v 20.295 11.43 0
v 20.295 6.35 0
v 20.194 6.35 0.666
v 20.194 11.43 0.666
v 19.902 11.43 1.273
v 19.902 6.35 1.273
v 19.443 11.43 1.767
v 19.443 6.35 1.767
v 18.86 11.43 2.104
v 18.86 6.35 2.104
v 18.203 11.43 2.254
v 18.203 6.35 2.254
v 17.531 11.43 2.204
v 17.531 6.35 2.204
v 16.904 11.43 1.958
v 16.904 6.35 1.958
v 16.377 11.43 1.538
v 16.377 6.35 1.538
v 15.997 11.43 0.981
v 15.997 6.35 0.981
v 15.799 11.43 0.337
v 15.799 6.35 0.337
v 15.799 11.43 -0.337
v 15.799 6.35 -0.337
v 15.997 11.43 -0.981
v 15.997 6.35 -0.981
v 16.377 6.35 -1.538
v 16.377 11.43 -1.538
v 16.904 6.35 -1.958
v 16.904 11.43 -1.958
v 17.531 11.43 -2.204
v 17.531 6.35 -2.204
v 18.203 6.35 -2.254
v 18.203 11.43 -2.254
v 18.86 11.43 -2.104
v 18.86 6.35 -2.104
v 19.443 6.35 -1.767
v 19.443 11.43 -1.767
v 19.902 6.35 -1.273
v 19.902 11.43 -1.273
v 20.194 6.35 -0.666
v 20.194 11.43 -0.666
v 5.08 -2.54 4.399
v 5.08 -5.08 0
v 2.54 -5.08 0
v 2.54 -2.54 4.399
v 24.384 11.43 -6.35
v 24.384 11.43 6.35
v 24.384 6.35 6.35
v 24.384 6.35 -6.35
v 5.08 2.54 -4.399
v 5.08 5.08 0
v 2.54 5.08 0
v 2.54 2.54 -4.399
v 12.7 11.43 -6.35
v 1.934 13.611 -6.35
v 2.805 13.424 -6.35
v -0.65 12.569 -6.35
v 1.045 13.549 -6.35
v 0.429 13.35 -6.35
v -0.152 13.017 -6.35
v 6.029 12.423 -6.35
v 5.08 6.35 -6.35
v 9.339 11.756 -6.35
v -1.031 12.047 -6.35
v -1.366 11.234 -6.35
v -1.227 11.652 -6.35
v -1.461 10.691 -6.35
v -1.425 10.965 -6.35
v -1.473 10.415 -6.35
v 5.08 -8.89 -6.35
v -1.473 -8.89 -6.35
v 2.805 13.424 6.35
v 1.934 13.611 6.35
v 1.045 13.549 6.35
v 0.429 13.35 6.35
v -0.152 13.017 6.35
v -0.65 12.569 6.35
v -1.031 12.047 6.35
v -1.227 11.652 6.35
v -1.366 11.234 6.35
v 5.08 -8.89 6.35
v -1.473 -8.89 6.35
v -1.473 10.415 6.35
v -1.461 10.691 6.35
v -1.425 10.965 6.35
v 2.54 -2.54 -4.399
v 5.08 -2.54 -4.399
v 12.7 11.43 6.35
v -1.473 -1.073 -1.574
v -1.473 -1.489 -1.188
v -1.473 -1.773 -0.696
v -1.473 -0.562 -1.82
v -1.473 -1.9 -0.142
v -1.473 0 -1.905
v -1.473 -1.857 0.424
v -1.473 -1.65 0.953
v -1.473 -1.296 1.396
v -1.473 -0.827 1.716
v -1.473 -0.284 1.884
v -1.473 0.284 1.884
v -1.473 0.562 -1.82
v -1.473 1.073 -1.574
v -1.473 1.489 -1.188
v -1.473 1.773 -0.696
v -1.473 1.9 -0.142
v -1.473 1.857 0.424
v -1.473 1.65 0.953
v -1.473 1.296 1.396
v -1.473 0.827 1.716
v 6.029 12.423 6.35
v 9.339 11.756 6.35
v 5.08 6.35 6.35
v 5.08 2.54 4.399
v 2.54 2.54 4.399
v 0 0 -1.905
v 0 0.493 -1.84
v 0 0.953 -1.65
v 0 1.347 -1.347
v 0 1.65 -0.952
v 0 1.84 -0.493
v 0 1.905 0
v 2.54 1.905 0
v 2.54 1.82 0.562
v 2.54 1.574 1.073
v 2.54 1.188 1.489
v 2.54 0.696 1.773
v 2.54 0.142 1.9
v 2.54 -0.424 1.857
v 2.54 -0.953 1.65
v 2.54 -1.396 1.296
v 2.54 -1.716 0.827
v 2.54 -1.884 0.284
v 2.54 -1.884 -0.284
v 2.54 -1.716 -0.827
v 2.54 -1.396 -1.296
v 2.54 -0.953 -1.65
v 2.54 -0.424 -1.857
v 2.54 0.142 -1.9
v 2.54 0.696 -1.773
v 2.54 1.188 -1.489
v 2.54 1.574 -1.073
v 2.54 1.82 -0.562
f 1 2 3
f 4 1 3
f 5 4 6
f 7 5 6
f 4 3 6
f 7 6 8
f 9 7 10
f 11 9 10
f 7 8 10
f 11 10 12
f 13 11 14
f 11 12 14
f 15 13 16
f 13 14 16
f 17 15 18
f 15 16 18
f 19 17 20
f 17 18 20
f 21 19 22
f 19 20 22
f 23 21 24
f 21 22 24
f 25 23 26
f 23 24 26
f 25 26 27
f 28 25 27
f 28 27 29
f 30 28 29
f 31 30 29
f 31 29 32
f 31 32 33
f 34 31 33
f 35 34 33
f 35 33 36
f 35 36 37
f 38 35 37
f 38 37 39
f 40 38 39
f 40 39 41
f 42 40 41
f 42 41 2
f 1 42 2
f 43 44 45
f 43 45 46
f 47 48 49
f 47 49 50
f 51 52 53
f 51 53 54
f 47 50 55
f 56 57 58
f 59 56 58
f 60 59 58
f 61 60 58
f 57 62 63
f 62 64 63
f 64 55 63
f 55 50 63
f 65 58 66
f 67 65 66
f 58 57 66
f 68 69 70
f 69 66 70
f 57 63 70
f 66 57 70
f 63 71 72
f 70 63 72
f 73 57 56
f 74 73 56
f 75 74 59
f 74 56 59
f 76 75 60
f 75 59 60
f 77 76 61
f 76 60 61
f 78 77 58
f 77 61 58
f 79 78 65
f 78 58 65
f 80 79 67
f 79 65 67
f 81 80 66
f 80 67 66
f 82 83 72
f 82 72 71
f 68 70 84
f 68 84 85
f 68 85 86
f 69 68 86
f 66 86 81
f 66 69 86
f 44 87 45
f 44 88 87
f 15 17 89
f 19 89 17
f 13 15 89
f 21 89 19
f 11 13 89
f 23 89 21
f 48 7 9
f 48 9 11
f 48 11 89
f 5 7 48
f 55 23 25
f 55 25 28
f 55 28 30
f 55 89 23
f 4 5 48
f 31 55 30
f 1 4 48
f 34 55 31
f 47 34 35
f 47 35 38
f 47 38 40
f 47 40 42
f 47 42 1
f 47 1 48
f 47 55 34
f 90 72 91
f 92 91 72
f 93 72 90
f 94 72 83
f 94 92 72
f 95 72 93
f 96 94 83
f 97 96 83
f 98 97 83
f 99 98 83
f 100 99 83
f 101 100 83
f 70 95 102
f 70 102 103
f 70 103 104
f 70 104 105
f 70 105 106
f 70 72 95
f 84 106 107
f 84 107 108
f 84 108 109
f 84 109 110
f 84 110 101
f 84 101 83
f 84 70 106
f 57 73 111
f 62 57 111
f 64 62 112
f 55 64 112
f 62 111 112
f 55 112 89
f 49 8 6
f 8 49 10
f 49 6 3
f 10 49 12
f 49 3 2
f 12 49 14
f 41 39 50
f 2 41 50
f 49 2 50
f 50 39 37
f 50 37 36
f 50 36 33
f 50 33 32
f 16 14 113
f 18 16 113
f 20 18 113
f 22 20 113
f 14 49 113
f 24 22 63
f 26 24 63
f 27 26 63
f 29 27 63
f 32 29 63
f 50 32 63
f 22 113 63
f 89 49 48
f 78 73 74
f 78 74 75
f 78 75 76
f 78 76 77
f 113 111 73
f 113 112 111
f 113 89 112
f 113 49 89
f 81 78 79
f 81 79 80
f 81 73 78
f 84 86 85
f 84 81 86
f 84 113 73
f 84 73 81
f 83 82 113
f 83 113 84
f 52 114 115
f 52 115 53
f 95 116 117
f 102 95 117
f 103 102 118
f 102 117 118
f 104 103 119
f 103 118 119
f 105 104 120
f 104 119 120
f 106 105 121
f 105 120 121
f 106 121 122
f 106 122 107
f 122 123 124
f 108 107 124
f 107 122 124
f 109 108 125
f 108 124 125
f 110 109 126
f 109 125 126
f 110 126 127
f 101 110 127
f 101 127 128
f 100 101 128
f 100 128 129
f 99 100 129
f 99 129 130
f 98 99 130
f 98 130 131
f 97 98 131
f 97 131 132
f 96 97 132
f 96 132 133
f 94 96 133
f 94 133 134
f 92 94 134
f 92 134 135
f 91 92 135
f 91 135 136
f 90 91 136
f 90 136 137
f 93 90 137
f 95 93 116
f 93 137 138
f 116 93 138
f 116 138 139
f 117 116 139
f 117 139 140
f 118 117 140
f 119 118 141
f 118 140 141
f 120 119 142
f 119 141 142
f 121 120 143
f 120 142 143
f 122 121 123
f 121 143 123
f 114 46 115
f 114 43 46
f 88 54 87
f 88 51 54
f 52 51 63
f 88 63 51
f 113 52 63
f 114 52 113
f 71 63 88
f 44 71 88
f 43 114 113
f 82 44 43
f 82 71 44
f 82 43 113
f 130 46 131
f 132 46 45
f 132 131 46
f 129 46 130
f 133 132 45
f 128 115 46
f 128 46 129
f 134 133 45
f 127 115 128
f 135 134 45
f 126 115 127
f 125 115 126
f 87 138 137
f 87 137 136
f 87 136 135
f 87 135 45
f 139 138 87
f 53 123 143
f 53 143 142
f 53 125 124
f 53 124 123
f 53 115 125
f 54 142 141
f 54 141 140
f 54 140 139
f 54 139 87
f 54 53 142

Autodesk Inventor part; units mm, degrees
ref_plane "YZ Plane" through (0, 0, 0) normal (1, 0, 0) x (0, 1, 0)
ref_plane "XZ Plane" through (0, 0, 0) normal (0, 1, 0) x (-1, 0, 0)
ref_plane "XY Plane" through (0, 0, 0) normal (0, 0, 1) x (1, 0, 0)
sketch "Sketch1" plane through (0, 0, 0) normal (1, 0, 0) x (0, 1, 0)
  circle A0 centre (0, 0) radius 1.905
  line L0 (0, 0) -> (0, -6.35)
  line L1 (0, 0) -> (0, 6.35)
  line L2 (0, 6.35) -> (-6.35, 6.35)
  line L3 (0, -6.35) -> (6.35, -6.35)
  line L4 (-6.35, 6.35) -> (6.35, 6.35)
  line L5 (6.35, 6.35) -> (6.35, -6.35)
  line L6 (6.35, -6.35) -> (-6.35, -6.35)
  line L7 (-6.35, -6.35) -> (-6.35, 6.35)
  dimension "d0" = 3.81
  dimension "d2" = 6.35
  dimension "d3" = 6.35
  dimension "d4" = 6.35
  dimension "d5" = 6.35
extrude "Extrusion1" add sketch "Sketch1" along normal blind 5.08 contours A0 L1 L4 L5 L3 L0 | A0 L0 L6 L7 L2 L1
sketch "Sketch2" plane through (5.08, 0, 0) normal (1, 0, 0) x (0, 0, -1)
  point P0 (0, 0)
sketch "Sketch3" plane through (5.08, 0, 0) normal (1, 0, 0) x (0, 0, -1)
  line L0 (0, 0) -> (0, -5.08)
  arc A0 (0, -5.08) -> (0, 0) centre (-4.3994, -2.54) ccw
  line L1 (4.3994, -2.54) -> (0, -5.08)
  line L2 (0, -5.08) -> (-4.3994, -2.54)
  line L3 (-4.3994, 2.54) -> (0, 5.08)
  line L4 (4.3994, 2.54) -> (4.3994, -2.54)
  line L5 (-4.3994, -2.54) -> (-4.3994, 2.54)
  line L6 (0, 5.08) -> (4.3994, 2.54)
  dimension "d8" = 5.08
extrude "Extrusion2" cut sketch "Sketch3" against normal blind 2.54 contours A0 L0 | L2 L5 L3 L6 L4 L1
sketch "Sketch4" plane through (0, -6.35, -6.35) normal (0, -1, 0) x (1, 0, 0)
  line L0 (0, 12.7) -> (5.08, 12.7) projected
  line L1 (0, 0) -> (5.08, 0) projected
  line L2 (5.08, 12.7) -> (0, 12.7)
  line L3 (0, 12.7) -> (0, 0)
  line L4 (0, 0) -> (5.08, 0)
  line L5 (5.08, 0) -> (5.08, 12.7)
  point P0 (0, 6.35)
extrude "Extrusion3" add sketch "Sketch4" along normal blind 2.54
sketch "Sketch5" plane through (0, 6.35, 6.35) normal (0, 1, 0) x (1, 0, 0)
  line L0 (5.08, 0) -> (0, 0) projected
  line L1 (5.08, 12.7) -> (5.08, 0) projected
  line L2 (0, 0) -> (5.08, 0)
  line L3 (5.08, 0) -> (5.08, 12.7)
  line L4 (5.08, 12.7) -> (0, 12.7)
  line L5 (0, 12.7) -> (0, 0)
  point P0 (0, 6.35)
extrude "Extrusion4" add sketch "Sketch5" along normal blind 5.08
sketch "Sketch6" plane through (5.08, 0, 0) normal (1, 0, 0) x (0, 0, -1)
  line L0 (-6.35, -8.89) -> (-6.35, 11.43) projected
  line L1 (-6.35, 11.43) -> (-6.35, 6.35)
  line L2 (-6.35, -8.89) -> (-6.35, -6.35)
  line L3 (6.35, 11.43) -> (-6.35, 11.43) projected
  line L4 (-6.35, 6.35) -> (6.35, 6.35)
  line L5 (6.35, 6.35) -> (6.35, 11.43)
  line L6 (6.35, 11.43) -> (-6.35, 11.43)
  line L7 (-6.35, 11.43) -> (-6.35, 6.35)
  line L8 (6.35, -8.89) -> (-6.35, -8.89) projected
  line L9 (-6.35, -6.35) -> (6.35, -6.35)
  line L10 (6.35, -6.35) -> (6.35, -8.89)
  line L11 (6.35, -8.89) -> (-6.35, -8.89)
  line L12 (-6.35, -8.89) -> (-6.35, -6.35)
  point P0 (0, 0)
  dimension "d15" = 5.08
  dimension "d16" = 2.54
extrude "Extrusion5" add sketch "Sketch6" along normal blind 19.304
sketch "Sketch7" plane through (0, -8.89, -6.35) normal (0, -1, 0) x (1, 0, 0)
  line L0 (24.384, 0) -> (24.384, 12.7) projected
  line L1 (24.384, 6.35) -> (18.034, 6.35)
  circle A0 centre (18.034, 6.35) radius 2.2606
  point P0 (0, 6.35)
  dimension "d19" = 6.35
  dimension "d20" = 4.5212
extrude "Extrusion6" cut sketch "Sketch7" against normal blind 63.5
sketch "Sketch8" plane through (0, -8.89, 6.35) normal (0, 0, 1) x (1, 0, 0)
  line L0 (0, 0) -> (24.384, 0) projected
  line L1 (5.08, 2.54) -> (24.384, 2.54) projected
  line L2 (24.384, 0) -> (5.08, 0)
  line L3 (5.08, 0) -> (5.08, 2.54)
  line L4 (5.08, 2.54) -> (24.384, 2.54)
  line L5 (24.384, 2.54) -> (24.384, 0)
  point P0 (0, 8.89)
extrude "Extrusion7" cut sketch "Sketch8" against normal blind 25.4
sketch "Sketch10" plane through (0, -8.89, 6.35) normal (0, 0, 1) x (1, 0, 0)
  line L0 (5.08, 15.24) -> (0, 15.24)
  line L1 (0, 0) -> (0, 20.32) projected
  line L2 (0, 15.24) -> (0, 20.32)
  line L3 (0, 20.32) -> (-3.175, 20.32)
  arc A0 (0, 15.24) -> (-3.175, 20.32) centre (-9.8202, 12.6345) ccw
  line L4 (0, 20.32) -> (0, 23.495)
  arc A1 (-3.175, 20.32) -> (0, 23.495) centre (-8.5941, 28.9141) ccw
  line L5 (0, 20.32) -> (12.7, 20.32)
  line L6 (0, 20.32) -> (24.384, 20.32) projected
  arc A2 (0, 23.495) -> (12.7, 20.32) centre (14.1996, 53.3059) ccw
  point P0 (0, 8.89)
  dimension "d25" = 3.175
  dimension "d26" = 10.16
  dimension "d27" = 3.175
  dimension "d28" = 10.16
  dimension "d29" = 12.7
  dimension "d30" = 33.02
extrude "Extrusion8" add sketch "Sketch10" against normal up to surface (12.7 mm away)
fillet "Fillet1" radius 3.175 2 edges at (0, 14.605, 0) (-3.175, 11.43, 0)
sketch "Sketch11" plane through (0, 0, 0) normal (-1, 0, 0) x (0, 0, 1)
  line L0 (6.35, -8.89) -> (-6.35, -8.89) projected
  line L1 (-6.35, 8.8491) -> (-6.35, 13.6192) projected
  line L2 (6.35, -8.89) -> (-6.35, -8.89)
  line L3 (-6.35, -8.89) -> (-6.35, 11.2341)
  line L4 (-6.35, 11.2341) -> (6.35, 11.2341)
  line L5 (6.35, 11.2341) -> (6.35, -8.89)
  point P0 (0, 0)
  point P1 (-6.35, 13.4242)
extrude "Extrusion9" add sketch "Sketch11" along normal blind 1.4732
fillet "Fillet2" radius 3.175 1 edges at (-1.4732, 11.2341, 0)
sketch "Sketch12" plane through (0, 0, 0) normal (1, 0, 0) x (0, 0, -1)
  circle A0 centre (0, 0) radius 1.905
extrude "Extrusion10" cut sketch "Sketch12" against normal blind 18.9357
properties part number "printed piston fitting wings"
